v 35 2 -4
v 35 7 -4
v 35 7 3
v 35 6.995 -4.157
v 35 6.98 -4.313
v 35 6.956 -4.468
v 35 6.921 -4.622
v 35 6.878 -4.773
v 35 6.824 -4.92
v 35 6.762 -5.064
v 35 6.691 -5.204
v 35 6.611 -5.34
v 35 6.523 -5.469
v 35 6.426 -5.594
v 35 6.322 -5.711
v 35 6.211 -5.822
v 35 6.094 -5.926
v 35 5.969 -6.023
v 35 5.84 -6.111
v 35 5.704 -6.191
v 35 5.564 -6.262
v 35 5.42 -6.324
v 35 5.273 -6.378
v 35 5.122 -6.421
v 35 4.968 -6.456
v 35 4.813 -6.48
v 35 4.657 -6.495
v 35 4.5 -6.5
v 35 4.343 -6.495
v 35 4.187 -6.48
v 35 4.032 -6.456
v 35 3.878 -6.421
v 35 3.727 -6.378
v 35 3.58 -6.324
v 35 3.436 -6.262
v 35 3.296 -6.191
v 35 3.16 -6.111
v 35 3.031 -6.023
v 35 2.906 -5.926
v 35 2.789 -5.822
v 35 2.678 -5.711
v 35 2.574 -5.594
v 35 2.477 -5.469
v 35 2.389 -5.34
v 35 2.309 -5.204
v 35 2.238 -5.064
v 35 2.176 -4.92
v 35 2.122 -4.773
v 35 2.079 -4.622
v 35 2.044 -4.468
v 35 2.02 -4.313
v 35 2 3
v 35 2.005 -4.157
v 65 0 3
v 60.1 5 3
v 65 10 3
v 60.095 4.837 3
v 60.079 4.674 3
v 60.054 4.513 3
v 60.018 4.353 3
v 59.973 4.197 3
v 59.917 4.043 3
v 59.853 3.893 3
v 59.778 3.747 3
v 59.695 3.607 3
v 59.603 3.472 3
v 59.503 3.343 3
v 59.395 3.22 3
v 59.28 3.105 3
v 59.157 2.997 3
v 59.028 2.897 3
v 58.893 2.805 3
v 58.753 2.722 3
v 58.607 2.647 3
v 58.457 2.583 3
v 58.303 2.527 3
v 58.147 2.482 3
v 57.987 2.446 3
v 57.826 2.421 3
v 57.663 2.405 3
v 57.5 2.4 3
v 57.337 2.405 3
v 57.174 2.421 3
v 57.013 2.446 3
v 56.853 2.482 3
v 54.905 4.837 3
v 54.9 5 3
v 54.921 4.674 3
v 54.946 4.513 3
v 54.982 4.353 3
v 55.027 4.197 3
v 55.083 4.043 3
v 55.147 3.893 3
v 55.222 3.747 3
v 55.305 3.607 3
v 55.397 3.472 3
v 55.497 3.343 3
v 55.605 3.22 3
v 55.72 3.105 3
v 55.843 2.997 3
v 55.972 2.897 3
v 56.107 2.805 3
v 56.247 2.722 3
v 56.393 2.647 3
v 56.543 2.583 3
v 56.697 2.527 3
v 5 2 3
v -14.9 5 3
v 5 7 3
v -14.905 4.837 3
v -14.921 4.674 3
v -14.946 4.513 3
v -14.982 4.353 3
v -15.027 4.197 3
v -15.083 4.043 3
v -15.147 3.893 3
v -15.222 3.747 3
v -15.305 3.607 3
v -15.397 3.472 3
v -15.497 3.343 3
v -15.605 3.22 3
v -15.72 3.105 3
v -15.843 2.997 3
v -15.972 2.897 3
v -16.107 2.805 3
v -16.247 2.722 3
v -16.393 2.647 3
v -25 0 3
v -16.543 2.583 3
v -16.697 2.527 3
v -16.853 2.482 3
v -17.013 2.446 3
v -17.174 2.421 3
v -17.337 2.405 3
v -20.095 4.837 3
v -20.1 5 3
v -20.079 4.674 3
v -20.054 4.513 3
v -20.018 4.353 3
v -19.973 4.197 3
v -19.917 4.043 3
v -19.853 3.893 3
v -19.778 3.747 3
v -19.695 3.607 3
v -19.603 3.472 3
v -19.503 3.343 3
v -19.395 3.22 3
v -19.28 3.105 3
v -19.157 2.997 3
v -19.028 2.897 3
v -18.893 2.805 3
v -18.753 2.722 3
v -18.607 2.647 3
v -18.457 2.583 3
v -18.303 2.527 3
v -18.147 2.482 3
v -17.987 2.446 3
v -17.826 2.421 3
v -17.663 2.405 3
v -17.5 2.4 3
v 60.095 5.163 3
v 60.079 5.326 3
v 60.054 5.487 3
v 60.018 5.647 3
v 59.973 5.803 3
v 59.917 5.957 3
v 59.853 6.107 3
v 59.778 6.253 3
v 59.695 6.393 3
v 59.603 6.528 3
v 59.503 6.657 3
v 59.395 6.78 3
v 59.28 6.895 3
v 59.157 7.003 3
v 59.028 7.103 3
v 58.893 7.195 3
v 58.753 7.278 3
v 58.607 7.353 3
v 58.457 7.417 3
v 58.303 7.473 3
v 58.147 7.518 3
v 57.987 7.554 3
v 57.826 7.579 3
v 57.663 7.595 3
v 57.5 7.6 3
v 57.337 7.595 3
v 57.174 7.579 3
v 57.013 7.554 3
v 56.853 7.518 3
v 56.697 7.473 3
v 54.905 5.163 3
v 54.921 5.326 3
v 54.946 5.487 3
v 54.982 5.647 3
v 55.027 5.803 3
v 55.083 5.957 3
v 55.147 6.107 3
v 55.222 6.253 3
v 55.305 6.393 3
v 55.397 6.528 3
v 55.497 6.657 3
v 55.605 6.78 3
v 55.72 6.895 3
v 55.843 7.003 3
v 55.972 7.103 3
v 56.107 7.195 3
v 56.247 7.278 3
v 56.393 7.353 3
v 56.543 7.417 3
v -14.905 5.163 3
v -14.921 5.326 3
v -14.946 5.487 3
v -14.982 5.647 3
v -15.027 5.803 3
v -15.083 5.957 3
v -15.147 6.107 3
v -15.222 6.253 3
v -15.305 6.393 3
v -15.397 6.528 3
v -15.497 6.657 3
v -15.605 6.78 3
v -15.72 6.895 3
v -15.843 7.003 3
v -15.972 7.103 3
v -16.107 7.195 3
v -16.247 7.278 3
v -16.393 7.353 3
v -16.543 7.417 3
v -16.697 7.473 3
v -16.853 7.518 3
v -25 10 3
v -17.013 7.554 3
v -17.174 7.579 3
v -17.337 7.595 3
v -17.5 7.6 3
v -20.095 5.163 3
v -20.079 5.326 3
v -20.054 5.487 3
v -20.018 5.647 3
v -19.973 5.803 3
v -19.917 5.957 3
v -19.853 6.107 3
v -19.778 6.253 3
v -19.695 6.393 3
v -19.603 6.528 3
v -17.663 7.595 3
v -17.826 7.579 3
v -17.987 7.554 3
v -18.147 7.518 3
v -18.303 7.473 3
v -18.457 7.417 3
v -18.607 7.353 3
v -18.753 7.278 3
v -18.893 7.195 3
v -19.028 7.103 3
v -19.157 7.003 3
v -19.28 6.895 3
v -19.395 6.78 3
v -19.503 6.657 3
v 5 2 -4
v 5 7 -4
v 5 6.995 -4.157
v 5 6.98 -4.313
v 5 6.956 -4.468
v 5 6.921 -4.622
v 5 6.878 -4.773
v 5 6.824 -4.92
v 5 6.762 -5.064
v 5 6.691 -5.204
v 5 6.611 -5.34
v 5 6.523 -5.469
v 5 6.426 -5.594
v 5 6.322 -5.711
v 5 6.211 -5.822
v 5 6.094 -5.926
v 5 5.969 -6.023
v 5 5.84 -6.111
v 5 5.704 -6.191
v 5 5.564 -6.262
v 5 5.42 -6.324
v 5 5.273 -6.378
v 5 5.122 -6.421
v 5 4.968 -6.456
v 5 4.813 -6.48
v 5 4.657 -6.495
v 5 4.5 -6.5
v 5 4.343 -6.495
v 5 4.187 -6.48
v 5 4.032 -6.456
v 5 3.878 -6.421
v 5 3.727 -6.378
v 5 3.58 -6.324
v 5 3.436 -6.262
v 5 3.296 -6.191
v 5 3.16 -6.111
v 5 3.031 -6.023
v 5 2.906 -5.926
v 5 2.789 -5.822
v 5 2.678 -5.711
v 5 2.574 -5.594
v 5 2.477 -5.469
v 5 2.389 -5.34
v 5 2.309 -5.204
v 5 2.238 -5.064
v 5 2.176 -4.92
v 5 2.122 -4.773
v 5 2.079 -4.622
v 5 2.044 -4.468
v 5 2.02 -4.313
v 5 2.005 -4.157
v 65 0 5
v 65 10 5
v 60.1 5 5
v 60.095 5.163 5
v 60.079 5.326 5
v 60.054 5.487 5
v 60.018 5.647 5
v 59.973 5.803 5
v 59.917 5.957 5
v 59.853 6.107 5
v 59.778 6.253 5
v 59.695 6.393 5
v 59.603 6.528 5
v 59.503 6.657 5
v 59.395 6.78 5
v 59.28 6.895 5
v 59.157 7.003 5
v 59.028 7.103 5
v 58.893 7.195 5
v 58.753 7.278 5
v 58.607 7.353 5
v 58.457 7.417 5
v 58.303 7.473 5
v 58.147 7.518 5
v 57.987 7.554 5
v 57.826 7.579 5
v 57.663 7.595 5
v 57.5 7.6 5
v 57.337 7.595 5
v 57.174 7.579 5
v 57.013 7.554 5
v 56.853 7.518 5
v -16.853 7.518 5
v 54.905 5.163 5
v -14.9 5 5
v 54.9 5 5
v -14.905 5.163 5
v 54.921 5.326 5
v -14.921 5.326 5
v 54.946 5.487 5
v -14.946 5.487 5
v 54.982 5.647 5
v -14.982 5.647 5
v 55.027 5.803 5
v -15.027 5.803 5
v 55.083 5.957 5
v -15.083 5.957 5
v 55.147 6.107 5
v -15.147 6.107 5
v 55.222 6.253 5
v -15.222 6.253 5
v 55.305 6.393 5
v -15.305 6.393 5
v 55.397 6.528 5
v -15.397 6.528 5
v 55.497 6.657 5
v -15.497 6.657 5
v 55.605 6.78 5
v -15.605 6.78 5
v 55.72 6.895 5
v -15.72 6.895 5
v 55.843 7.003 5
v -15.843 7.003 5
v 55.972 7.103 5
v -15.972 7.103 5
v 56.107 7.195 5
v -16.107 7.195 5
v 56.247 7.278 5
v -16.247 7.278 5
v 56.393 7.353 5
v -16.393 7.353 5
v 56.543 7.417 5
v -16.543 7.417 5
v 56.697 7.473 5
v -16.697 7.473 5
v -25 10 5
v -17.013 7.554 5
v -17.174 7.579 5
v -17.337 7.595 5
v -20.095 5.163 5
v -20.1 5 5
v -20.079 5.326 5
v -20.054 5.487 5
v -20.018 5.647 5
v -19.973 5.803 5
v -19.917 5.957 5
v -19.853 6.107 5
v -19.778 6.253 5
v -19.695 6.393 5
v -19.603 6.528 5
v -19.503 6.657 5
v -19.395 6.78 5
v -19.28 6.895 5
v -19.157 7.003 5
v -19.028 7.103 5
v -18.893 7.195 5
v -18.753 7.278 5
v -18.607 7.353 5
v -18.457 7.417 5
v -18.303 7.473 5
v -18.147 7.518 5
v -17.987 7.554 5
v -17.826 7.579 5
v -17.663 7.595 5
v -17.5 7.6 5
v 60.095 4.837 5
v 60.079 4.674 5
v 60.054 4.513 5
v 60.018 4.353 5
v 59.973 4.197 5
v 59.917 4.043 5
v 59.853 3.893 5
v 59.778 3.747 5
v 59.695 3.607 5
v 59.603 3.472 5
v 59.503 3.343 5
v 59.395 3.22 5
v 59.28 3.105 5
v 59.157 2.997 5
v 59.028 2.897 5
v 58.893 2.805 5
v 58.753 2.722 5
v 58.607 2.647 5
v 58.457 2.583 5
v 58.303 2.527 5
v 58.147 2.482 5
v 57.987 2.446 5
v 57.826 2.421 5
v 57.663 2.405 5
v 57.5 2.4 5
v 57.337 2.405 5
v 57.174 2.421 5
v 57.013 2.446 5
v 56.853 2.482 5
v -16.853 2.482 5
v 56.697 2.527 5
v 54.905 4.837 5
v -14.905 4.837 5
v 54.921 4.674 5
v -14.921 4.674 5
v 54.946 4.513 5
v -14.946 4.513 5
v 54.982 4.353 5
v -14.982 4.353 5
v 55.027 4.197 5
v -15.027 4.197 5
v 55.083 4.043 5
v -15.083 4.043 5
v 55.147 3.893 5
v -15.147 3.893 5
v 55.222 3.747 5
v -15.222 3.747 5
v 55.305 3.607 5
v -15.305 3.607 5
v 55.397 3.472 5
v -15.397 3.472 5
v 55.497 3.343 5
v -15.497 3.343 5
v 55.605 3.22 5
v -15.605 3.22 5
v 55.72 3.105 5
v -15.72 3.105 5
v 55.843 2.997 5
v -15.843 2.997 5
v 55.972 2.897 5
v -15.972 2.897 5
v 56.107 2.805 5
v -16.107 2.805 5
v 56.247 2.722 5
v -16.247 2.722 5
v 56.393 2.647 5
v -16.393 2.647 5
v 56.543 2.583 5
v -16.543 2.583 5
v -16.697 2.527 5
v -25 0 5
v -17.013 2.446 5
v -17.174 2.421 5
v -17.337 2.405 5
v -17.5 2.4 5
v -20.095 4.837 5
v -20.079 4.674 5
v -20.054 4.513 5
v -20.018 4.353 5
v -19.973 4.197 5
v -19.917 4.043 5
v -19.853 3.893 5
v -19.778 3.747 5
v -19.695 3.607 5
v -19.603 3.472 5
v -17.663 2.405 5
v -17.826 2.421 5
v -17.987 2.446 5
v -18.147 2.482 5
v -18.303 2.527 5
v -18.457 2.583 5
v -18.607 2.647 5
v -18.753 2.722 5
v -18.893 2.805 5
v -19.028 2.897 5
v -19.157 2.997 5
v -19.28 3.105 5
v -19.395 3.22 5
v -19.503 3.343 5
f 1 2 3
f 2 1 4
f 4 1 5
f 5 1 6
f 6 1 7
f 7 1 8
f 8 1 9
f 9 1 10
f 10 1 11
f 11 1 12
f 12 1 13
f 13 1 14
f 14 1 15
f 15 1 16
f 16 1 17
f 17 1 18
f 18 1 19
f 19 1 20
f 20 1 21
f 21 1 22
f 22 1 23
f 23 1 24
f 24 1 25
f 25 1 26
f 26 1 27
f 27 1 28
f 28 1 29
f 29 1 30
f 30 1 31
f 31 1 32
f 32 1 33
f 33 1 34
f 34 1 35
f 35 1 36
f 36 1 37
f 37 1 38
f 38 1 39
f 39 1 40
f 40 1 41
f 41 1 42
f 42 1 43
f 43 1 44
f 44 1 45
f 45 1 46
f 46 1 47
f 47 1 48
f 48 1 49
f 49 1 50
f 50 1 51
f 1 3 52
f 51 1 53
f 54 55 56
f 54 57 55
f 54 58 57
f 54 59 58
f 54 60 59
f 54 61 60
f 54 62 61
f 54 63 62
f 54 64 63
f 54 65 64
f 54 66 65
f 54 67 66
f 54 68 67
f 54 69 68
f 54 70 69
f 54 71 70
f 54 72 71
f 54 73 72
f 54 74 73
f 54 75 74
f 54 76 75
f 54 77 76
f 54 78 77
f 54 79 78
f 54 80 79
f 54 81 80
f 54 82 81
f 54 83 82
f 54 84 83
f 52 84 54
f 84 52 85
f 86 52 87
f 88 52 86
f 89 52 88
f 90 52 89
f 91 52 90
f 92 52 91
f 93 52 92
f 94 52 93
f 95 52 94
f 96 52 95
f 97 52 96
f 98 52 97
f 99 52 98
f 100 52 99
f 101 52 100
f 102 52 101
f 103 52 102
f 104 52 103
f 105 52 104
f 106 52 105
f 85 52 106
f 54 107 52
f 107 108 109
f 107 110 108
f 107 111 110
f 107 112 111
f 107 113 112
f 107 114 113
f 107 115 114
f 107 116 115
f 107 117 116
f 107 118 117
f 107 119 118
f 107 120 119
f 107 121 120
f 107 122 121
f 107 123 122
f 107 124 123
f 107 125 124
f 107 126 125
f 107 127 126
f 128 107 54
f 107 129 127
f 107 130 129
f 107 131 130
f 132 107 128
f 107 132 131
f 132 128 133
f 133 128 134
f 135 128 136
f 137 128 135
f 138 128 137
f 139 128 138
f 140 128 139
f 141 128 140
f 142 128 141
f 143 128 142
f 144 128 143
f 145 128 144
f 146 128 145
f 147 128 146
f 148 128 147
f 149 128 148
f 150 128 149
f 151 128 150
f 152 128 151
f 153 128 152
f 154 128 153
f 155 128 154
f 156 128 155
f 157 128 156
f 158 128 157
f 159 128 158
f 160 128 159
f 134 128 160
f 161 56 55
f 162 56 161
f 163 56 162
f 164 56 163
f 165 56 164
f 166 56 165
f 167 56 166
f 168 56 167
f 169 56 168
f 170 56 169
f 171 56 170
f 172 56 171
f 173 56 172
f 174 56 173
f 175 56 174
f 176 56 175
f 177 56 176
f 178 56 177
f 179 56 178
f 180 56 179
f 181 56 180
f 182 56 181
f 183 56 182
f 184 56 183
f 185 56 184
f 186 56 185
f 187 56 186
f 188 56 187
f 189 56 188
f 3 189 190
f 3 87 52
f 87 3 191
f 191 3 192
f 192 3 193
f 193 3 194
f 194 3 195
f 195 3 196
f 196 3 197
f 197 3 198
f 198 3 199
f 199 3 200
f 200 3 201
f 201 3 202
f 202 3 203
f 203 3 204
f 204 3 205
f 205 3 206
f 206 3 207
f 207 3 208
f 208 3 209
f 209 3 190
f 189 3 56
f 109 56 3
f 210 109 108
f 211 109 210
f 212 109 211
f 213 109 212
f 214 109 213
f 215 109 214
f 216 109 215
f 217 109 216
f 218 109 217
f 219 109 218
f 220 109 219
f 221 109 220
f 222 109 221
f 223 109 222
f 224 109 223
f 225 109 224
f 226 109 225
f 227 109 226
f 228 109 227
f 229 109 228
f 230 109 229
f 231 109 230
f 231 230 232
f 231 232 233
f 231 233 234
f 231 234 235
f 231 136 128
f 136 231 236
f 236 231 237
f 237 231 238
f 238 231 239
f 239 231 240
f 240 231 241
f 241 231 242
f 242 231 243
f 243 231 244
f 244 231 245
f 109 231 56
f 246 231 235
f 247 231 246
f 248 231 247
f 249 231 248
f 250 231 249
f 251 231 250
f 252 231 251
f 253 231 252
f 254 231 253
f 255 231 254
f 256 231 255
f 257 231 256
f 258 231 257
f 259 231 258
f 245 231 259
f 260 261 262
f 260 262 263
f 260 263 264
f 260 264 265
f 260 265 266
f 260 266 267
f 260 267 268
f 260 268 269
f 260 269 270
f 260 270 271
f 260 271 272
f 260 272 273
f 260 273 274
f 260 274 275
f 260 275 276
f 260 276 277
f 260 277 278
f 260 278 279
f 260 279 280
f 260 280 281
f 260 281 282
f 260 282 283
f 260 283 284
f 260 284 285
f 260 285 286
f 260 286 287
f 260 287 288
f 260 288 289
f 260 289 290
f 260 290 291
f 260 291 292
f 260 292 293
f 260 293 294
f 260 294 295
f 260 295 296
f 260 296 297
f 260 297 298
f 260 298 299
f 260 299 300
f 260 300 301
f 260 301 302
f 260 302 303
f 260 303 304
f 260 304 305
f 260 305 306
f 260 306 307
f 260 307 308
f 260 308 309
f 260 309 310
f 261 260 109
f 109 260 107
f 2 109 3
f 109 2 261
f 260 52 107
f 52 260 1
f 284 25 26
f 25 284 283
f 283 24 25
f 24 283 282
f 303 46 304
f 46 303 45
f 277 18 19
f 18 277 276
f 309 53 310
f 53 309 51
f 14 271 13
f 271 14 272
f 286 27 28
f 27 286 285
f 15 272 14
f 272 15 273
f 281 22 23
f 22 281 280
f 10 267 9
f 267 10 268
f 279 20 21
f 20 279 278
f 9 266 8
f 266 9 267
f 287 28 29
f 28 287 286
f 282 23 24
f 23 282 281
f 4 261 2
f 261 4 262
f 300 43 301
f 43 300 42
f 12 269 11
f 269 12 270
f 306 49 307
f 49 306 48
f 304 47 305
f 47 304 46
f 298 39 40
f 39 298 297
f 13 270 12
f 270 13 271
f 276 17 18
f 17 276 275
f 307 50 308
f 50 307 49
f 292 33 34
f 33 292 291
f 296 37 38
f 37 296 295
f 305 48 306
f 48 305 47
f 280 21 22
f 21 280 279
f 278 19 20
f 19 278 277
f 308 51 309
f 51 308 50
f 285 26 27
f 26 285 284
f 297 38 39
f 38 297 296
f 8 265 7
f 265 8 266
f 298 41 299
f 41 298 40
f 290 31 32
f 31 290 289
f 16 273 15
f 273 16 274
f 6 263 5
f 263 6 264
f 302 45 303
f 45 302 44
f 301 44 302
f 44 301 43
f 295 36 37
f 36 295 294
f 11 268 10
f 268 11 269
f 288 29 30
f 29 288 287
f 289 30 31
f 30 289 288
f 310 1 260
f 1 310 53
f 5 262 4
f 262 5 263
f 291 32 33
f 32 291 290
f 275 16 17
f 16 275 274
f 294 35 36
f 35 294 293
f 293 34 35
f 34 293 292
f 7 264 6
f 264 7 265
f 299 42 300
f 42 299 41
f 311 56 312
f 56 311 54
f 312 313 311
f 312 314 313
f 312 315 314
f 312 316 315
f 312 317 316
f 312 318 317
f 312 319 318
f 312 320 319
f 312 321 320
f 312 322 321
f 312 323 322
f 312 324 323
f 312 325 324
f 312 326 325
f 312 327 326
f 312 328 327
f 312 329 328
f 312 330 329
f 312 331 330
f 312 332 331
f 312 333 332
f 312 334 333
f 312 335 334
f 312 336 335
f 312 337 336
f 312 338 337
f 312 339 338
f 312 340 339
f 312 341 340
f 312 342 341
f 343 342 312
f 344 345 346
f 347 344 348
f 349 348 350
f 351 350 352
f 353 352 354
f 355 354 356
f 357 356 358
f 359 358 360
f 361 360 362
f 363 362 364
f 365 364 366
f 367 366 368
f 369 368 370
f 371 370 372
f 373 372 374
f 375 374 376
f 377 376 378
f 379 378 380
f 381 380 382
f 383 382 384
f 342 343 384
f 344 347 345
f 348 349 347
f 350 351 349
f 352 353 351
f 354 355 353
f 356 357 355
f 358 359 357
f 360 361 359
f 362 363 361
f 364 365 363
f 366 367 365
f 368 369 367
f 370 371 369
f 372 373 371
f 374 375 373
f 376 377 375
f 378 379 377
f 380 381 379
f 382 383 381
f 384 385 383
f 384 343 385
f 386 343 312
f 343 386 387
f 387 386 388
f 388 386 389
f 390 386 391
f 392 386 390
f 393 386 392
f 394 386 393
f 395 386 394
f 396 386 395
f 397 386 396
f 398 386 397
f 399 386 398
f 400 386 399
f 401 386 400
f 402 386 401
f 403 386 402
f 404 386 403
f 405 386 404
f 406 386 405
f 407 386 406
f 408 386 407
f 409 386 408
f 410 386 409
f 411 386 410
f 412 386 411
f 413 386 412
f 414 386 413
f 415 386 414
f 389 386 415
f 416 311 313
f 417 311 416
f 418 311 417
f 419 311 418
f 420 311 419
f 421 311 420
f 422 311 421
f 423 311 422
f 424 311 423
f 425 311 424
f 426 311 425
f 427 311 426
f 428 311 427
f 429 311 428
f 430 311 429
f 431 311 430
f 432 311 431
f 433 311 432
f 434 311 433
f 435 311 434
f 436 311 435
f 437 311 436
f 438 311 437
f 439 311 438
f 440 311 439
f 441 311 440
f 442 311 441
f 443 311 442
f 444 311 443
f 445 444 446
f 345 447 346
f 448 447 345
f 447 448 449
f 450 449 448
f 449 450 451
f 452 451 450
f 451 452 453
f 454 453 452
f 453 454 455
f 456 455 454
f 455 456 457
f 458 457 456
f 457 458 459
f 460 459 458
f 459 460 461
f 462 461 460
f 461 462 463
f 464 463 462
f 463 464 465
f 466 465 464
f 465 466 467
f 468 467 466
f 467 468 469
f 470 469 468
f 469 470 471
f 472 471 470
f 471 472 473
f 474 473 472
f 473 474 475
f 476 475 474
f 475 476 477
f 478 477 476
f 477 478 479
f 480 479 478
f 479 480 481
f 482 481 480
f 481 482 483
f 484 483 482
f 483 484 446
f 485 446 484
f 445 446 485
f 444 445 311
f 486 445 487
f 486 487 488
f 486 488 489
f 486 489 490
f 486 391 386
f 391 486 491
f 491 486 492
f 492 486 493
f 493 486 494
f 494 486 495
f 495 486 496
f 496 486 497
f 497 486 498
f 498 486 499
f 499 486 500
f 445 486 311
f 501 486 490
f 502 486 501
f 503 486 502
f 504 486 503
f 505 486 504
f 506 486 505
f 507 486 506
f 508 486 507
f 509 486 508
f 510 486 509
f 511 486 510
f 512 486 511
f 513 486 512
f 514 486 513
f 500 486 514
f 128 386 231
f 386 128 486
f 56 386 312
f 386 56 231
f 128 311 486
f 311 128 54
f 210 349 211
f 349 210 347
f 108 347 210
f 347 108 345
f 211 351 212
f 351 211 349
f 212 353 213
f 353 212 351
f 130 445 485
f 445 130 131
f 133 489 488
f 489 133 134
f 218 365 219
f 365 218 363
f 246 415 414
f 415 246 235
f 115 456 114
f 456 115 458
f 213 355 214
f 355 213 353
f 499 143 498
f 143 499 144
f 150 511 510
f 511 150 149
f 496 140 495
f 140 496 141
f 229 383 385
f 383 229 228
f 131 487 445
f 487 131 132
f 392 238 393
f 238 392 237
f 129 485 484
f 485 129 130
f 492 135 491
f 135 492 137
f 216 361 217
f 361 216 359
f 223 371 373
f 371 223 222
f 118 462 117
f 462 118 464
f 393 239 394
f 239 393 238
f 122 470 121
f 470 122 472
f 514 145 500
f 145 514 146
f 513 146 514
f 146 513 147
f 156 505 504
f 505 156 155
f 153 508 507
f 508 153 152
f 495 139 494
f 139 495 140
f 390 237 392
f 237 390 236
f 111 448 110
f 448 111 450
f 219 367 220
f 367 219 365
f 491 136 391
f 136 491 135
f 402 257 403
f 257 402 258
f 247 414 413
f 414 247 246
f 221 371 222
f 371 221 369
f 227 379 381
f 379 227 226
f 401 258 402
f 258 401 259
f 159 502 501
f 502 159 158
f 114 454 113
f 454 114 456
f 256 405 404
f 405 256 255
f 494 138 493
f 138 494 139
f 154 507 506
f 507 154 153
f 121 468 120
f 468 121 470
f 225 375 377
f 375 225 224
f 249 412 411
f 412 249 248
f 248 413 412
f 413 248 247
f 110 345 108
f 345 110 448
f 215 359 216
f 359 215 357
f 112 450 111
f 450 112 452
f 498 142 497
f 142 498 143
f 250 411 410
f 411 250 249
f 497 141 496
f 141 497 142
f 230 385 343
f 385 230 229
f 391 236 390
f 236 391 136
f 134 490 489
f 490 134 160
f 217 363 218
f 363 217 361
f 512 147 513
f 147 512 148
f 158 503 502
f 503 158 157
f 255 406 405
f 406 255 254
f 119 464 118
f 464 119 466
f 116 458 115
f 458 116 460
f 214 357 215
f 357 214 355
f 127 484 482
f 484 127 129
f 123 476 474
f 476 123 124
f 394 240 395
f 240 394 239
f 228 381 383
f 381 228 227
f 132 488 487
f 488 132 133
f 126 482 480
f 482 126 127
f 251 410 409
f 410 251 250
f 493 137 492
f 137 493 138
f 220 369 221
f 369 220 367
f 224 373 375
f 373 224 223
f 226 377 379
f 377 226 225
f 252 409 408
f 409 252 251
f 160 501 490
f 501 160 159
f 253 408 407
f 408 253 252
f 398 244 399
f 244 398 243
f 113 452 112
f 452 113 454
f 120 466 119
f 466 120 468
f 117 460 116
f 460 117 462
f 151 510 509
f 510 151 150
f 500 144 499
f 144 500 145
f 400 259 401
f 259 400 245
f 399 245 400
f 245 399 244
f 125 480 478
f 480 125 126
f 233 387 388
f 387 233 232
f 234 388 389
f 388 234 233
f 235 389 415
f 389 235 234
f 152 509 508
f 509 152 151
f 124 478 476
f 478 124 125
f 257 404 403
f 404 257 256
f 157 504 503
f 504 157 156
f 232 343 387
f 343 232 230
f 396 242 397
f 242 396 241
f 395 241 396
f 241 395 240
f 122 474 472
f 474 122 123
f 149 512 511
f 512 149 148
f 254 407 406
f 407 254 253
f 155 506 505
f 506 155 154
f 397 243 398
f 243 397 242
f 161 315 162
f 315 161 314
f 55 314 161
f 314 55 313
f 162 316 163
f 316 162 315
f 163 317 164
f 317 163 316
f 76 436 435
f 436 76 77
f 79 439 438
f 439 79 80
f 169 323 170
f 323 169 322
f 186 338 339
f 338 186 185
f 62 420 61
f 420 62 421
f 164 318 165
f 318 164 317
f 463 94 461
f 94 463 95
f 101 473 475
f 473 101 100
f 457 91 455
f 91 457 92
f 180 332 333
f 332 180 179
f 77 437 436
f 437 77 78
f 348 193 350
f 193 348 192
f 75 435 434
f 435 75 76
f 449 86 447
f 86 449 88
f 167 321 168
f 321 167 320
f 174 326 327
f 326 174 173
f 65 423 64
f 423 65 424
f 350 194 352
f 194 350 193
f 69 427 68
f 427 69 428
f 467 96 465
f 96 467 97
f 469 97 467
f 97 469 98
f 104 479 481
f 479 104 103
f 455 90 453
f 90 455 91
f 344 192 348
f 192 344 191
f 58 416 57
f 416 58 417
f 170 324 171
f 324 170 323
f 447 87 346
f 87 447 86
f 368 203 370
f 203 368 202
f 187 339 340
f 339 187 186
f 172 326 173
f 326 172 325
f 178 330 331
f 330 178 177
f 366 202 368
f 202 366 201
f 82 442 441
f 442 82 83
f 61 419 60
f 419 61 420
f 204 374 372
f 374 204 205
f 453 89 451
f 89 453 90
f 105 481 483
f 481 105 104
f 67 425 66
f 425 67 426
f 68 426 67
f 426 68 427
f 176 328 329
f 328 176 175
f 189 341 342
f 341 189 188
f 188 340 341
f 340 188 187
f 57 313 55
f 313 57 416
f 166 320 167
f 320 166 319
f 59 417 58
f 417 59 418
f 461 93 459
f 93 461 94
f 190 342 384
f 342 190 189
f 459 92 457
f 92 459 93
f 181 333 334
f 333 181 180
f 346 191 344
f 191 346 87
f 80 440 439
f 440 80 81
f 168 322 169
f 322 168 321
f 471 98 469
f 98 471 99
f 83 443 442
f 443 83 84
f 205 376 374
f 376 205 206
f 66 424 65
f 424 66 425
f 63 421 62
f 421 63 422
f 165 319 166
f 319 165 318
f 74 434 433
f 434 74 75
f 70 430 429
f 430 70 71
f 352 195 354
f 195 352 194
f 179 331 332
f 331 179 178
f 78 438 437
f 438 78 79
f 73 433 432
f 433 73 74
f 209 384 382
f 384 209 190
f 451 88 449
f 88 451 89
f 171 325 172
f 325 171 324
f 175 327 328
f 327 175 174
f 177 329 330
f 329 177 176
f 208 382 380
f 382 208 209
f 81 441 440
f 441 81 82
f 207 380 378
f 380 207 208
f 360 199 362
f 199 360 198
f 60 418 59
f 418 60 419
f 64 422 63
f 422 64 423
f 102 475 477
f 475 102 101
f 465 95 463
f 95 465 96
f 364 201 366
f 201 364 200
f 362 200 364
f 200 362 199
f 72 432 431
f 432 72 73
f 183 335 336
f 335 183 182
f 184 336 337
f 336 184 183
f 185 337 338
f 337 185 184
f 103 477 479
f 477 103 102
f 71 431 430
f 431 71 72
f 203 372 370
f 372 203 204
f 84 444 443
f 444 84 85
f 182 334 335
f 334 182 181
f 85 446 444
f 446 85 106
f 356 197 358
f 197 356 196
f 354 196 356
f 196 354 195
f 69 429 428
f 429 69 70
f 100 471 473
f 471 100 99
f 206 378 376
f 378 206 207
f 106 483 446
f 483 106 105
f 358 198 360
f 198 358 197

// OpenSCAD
$fn=100;

module anti_basculement(){
translate([5,2,-4])union(){
	
	cube([30,5,7]);
	translate([0,2.5,0])rotate([0,90,0])cylinder(d=5,h=30);
	}
difference(){
	translate([-50/2,0,3])cube([90,10,2]);
	
	translate([-17.5,5,1])cylinder(d=5.2,h=5);
	translate([57.5,5,1])cylinder(d=5.2,h=5);
	}	
}

anti_basculement();
